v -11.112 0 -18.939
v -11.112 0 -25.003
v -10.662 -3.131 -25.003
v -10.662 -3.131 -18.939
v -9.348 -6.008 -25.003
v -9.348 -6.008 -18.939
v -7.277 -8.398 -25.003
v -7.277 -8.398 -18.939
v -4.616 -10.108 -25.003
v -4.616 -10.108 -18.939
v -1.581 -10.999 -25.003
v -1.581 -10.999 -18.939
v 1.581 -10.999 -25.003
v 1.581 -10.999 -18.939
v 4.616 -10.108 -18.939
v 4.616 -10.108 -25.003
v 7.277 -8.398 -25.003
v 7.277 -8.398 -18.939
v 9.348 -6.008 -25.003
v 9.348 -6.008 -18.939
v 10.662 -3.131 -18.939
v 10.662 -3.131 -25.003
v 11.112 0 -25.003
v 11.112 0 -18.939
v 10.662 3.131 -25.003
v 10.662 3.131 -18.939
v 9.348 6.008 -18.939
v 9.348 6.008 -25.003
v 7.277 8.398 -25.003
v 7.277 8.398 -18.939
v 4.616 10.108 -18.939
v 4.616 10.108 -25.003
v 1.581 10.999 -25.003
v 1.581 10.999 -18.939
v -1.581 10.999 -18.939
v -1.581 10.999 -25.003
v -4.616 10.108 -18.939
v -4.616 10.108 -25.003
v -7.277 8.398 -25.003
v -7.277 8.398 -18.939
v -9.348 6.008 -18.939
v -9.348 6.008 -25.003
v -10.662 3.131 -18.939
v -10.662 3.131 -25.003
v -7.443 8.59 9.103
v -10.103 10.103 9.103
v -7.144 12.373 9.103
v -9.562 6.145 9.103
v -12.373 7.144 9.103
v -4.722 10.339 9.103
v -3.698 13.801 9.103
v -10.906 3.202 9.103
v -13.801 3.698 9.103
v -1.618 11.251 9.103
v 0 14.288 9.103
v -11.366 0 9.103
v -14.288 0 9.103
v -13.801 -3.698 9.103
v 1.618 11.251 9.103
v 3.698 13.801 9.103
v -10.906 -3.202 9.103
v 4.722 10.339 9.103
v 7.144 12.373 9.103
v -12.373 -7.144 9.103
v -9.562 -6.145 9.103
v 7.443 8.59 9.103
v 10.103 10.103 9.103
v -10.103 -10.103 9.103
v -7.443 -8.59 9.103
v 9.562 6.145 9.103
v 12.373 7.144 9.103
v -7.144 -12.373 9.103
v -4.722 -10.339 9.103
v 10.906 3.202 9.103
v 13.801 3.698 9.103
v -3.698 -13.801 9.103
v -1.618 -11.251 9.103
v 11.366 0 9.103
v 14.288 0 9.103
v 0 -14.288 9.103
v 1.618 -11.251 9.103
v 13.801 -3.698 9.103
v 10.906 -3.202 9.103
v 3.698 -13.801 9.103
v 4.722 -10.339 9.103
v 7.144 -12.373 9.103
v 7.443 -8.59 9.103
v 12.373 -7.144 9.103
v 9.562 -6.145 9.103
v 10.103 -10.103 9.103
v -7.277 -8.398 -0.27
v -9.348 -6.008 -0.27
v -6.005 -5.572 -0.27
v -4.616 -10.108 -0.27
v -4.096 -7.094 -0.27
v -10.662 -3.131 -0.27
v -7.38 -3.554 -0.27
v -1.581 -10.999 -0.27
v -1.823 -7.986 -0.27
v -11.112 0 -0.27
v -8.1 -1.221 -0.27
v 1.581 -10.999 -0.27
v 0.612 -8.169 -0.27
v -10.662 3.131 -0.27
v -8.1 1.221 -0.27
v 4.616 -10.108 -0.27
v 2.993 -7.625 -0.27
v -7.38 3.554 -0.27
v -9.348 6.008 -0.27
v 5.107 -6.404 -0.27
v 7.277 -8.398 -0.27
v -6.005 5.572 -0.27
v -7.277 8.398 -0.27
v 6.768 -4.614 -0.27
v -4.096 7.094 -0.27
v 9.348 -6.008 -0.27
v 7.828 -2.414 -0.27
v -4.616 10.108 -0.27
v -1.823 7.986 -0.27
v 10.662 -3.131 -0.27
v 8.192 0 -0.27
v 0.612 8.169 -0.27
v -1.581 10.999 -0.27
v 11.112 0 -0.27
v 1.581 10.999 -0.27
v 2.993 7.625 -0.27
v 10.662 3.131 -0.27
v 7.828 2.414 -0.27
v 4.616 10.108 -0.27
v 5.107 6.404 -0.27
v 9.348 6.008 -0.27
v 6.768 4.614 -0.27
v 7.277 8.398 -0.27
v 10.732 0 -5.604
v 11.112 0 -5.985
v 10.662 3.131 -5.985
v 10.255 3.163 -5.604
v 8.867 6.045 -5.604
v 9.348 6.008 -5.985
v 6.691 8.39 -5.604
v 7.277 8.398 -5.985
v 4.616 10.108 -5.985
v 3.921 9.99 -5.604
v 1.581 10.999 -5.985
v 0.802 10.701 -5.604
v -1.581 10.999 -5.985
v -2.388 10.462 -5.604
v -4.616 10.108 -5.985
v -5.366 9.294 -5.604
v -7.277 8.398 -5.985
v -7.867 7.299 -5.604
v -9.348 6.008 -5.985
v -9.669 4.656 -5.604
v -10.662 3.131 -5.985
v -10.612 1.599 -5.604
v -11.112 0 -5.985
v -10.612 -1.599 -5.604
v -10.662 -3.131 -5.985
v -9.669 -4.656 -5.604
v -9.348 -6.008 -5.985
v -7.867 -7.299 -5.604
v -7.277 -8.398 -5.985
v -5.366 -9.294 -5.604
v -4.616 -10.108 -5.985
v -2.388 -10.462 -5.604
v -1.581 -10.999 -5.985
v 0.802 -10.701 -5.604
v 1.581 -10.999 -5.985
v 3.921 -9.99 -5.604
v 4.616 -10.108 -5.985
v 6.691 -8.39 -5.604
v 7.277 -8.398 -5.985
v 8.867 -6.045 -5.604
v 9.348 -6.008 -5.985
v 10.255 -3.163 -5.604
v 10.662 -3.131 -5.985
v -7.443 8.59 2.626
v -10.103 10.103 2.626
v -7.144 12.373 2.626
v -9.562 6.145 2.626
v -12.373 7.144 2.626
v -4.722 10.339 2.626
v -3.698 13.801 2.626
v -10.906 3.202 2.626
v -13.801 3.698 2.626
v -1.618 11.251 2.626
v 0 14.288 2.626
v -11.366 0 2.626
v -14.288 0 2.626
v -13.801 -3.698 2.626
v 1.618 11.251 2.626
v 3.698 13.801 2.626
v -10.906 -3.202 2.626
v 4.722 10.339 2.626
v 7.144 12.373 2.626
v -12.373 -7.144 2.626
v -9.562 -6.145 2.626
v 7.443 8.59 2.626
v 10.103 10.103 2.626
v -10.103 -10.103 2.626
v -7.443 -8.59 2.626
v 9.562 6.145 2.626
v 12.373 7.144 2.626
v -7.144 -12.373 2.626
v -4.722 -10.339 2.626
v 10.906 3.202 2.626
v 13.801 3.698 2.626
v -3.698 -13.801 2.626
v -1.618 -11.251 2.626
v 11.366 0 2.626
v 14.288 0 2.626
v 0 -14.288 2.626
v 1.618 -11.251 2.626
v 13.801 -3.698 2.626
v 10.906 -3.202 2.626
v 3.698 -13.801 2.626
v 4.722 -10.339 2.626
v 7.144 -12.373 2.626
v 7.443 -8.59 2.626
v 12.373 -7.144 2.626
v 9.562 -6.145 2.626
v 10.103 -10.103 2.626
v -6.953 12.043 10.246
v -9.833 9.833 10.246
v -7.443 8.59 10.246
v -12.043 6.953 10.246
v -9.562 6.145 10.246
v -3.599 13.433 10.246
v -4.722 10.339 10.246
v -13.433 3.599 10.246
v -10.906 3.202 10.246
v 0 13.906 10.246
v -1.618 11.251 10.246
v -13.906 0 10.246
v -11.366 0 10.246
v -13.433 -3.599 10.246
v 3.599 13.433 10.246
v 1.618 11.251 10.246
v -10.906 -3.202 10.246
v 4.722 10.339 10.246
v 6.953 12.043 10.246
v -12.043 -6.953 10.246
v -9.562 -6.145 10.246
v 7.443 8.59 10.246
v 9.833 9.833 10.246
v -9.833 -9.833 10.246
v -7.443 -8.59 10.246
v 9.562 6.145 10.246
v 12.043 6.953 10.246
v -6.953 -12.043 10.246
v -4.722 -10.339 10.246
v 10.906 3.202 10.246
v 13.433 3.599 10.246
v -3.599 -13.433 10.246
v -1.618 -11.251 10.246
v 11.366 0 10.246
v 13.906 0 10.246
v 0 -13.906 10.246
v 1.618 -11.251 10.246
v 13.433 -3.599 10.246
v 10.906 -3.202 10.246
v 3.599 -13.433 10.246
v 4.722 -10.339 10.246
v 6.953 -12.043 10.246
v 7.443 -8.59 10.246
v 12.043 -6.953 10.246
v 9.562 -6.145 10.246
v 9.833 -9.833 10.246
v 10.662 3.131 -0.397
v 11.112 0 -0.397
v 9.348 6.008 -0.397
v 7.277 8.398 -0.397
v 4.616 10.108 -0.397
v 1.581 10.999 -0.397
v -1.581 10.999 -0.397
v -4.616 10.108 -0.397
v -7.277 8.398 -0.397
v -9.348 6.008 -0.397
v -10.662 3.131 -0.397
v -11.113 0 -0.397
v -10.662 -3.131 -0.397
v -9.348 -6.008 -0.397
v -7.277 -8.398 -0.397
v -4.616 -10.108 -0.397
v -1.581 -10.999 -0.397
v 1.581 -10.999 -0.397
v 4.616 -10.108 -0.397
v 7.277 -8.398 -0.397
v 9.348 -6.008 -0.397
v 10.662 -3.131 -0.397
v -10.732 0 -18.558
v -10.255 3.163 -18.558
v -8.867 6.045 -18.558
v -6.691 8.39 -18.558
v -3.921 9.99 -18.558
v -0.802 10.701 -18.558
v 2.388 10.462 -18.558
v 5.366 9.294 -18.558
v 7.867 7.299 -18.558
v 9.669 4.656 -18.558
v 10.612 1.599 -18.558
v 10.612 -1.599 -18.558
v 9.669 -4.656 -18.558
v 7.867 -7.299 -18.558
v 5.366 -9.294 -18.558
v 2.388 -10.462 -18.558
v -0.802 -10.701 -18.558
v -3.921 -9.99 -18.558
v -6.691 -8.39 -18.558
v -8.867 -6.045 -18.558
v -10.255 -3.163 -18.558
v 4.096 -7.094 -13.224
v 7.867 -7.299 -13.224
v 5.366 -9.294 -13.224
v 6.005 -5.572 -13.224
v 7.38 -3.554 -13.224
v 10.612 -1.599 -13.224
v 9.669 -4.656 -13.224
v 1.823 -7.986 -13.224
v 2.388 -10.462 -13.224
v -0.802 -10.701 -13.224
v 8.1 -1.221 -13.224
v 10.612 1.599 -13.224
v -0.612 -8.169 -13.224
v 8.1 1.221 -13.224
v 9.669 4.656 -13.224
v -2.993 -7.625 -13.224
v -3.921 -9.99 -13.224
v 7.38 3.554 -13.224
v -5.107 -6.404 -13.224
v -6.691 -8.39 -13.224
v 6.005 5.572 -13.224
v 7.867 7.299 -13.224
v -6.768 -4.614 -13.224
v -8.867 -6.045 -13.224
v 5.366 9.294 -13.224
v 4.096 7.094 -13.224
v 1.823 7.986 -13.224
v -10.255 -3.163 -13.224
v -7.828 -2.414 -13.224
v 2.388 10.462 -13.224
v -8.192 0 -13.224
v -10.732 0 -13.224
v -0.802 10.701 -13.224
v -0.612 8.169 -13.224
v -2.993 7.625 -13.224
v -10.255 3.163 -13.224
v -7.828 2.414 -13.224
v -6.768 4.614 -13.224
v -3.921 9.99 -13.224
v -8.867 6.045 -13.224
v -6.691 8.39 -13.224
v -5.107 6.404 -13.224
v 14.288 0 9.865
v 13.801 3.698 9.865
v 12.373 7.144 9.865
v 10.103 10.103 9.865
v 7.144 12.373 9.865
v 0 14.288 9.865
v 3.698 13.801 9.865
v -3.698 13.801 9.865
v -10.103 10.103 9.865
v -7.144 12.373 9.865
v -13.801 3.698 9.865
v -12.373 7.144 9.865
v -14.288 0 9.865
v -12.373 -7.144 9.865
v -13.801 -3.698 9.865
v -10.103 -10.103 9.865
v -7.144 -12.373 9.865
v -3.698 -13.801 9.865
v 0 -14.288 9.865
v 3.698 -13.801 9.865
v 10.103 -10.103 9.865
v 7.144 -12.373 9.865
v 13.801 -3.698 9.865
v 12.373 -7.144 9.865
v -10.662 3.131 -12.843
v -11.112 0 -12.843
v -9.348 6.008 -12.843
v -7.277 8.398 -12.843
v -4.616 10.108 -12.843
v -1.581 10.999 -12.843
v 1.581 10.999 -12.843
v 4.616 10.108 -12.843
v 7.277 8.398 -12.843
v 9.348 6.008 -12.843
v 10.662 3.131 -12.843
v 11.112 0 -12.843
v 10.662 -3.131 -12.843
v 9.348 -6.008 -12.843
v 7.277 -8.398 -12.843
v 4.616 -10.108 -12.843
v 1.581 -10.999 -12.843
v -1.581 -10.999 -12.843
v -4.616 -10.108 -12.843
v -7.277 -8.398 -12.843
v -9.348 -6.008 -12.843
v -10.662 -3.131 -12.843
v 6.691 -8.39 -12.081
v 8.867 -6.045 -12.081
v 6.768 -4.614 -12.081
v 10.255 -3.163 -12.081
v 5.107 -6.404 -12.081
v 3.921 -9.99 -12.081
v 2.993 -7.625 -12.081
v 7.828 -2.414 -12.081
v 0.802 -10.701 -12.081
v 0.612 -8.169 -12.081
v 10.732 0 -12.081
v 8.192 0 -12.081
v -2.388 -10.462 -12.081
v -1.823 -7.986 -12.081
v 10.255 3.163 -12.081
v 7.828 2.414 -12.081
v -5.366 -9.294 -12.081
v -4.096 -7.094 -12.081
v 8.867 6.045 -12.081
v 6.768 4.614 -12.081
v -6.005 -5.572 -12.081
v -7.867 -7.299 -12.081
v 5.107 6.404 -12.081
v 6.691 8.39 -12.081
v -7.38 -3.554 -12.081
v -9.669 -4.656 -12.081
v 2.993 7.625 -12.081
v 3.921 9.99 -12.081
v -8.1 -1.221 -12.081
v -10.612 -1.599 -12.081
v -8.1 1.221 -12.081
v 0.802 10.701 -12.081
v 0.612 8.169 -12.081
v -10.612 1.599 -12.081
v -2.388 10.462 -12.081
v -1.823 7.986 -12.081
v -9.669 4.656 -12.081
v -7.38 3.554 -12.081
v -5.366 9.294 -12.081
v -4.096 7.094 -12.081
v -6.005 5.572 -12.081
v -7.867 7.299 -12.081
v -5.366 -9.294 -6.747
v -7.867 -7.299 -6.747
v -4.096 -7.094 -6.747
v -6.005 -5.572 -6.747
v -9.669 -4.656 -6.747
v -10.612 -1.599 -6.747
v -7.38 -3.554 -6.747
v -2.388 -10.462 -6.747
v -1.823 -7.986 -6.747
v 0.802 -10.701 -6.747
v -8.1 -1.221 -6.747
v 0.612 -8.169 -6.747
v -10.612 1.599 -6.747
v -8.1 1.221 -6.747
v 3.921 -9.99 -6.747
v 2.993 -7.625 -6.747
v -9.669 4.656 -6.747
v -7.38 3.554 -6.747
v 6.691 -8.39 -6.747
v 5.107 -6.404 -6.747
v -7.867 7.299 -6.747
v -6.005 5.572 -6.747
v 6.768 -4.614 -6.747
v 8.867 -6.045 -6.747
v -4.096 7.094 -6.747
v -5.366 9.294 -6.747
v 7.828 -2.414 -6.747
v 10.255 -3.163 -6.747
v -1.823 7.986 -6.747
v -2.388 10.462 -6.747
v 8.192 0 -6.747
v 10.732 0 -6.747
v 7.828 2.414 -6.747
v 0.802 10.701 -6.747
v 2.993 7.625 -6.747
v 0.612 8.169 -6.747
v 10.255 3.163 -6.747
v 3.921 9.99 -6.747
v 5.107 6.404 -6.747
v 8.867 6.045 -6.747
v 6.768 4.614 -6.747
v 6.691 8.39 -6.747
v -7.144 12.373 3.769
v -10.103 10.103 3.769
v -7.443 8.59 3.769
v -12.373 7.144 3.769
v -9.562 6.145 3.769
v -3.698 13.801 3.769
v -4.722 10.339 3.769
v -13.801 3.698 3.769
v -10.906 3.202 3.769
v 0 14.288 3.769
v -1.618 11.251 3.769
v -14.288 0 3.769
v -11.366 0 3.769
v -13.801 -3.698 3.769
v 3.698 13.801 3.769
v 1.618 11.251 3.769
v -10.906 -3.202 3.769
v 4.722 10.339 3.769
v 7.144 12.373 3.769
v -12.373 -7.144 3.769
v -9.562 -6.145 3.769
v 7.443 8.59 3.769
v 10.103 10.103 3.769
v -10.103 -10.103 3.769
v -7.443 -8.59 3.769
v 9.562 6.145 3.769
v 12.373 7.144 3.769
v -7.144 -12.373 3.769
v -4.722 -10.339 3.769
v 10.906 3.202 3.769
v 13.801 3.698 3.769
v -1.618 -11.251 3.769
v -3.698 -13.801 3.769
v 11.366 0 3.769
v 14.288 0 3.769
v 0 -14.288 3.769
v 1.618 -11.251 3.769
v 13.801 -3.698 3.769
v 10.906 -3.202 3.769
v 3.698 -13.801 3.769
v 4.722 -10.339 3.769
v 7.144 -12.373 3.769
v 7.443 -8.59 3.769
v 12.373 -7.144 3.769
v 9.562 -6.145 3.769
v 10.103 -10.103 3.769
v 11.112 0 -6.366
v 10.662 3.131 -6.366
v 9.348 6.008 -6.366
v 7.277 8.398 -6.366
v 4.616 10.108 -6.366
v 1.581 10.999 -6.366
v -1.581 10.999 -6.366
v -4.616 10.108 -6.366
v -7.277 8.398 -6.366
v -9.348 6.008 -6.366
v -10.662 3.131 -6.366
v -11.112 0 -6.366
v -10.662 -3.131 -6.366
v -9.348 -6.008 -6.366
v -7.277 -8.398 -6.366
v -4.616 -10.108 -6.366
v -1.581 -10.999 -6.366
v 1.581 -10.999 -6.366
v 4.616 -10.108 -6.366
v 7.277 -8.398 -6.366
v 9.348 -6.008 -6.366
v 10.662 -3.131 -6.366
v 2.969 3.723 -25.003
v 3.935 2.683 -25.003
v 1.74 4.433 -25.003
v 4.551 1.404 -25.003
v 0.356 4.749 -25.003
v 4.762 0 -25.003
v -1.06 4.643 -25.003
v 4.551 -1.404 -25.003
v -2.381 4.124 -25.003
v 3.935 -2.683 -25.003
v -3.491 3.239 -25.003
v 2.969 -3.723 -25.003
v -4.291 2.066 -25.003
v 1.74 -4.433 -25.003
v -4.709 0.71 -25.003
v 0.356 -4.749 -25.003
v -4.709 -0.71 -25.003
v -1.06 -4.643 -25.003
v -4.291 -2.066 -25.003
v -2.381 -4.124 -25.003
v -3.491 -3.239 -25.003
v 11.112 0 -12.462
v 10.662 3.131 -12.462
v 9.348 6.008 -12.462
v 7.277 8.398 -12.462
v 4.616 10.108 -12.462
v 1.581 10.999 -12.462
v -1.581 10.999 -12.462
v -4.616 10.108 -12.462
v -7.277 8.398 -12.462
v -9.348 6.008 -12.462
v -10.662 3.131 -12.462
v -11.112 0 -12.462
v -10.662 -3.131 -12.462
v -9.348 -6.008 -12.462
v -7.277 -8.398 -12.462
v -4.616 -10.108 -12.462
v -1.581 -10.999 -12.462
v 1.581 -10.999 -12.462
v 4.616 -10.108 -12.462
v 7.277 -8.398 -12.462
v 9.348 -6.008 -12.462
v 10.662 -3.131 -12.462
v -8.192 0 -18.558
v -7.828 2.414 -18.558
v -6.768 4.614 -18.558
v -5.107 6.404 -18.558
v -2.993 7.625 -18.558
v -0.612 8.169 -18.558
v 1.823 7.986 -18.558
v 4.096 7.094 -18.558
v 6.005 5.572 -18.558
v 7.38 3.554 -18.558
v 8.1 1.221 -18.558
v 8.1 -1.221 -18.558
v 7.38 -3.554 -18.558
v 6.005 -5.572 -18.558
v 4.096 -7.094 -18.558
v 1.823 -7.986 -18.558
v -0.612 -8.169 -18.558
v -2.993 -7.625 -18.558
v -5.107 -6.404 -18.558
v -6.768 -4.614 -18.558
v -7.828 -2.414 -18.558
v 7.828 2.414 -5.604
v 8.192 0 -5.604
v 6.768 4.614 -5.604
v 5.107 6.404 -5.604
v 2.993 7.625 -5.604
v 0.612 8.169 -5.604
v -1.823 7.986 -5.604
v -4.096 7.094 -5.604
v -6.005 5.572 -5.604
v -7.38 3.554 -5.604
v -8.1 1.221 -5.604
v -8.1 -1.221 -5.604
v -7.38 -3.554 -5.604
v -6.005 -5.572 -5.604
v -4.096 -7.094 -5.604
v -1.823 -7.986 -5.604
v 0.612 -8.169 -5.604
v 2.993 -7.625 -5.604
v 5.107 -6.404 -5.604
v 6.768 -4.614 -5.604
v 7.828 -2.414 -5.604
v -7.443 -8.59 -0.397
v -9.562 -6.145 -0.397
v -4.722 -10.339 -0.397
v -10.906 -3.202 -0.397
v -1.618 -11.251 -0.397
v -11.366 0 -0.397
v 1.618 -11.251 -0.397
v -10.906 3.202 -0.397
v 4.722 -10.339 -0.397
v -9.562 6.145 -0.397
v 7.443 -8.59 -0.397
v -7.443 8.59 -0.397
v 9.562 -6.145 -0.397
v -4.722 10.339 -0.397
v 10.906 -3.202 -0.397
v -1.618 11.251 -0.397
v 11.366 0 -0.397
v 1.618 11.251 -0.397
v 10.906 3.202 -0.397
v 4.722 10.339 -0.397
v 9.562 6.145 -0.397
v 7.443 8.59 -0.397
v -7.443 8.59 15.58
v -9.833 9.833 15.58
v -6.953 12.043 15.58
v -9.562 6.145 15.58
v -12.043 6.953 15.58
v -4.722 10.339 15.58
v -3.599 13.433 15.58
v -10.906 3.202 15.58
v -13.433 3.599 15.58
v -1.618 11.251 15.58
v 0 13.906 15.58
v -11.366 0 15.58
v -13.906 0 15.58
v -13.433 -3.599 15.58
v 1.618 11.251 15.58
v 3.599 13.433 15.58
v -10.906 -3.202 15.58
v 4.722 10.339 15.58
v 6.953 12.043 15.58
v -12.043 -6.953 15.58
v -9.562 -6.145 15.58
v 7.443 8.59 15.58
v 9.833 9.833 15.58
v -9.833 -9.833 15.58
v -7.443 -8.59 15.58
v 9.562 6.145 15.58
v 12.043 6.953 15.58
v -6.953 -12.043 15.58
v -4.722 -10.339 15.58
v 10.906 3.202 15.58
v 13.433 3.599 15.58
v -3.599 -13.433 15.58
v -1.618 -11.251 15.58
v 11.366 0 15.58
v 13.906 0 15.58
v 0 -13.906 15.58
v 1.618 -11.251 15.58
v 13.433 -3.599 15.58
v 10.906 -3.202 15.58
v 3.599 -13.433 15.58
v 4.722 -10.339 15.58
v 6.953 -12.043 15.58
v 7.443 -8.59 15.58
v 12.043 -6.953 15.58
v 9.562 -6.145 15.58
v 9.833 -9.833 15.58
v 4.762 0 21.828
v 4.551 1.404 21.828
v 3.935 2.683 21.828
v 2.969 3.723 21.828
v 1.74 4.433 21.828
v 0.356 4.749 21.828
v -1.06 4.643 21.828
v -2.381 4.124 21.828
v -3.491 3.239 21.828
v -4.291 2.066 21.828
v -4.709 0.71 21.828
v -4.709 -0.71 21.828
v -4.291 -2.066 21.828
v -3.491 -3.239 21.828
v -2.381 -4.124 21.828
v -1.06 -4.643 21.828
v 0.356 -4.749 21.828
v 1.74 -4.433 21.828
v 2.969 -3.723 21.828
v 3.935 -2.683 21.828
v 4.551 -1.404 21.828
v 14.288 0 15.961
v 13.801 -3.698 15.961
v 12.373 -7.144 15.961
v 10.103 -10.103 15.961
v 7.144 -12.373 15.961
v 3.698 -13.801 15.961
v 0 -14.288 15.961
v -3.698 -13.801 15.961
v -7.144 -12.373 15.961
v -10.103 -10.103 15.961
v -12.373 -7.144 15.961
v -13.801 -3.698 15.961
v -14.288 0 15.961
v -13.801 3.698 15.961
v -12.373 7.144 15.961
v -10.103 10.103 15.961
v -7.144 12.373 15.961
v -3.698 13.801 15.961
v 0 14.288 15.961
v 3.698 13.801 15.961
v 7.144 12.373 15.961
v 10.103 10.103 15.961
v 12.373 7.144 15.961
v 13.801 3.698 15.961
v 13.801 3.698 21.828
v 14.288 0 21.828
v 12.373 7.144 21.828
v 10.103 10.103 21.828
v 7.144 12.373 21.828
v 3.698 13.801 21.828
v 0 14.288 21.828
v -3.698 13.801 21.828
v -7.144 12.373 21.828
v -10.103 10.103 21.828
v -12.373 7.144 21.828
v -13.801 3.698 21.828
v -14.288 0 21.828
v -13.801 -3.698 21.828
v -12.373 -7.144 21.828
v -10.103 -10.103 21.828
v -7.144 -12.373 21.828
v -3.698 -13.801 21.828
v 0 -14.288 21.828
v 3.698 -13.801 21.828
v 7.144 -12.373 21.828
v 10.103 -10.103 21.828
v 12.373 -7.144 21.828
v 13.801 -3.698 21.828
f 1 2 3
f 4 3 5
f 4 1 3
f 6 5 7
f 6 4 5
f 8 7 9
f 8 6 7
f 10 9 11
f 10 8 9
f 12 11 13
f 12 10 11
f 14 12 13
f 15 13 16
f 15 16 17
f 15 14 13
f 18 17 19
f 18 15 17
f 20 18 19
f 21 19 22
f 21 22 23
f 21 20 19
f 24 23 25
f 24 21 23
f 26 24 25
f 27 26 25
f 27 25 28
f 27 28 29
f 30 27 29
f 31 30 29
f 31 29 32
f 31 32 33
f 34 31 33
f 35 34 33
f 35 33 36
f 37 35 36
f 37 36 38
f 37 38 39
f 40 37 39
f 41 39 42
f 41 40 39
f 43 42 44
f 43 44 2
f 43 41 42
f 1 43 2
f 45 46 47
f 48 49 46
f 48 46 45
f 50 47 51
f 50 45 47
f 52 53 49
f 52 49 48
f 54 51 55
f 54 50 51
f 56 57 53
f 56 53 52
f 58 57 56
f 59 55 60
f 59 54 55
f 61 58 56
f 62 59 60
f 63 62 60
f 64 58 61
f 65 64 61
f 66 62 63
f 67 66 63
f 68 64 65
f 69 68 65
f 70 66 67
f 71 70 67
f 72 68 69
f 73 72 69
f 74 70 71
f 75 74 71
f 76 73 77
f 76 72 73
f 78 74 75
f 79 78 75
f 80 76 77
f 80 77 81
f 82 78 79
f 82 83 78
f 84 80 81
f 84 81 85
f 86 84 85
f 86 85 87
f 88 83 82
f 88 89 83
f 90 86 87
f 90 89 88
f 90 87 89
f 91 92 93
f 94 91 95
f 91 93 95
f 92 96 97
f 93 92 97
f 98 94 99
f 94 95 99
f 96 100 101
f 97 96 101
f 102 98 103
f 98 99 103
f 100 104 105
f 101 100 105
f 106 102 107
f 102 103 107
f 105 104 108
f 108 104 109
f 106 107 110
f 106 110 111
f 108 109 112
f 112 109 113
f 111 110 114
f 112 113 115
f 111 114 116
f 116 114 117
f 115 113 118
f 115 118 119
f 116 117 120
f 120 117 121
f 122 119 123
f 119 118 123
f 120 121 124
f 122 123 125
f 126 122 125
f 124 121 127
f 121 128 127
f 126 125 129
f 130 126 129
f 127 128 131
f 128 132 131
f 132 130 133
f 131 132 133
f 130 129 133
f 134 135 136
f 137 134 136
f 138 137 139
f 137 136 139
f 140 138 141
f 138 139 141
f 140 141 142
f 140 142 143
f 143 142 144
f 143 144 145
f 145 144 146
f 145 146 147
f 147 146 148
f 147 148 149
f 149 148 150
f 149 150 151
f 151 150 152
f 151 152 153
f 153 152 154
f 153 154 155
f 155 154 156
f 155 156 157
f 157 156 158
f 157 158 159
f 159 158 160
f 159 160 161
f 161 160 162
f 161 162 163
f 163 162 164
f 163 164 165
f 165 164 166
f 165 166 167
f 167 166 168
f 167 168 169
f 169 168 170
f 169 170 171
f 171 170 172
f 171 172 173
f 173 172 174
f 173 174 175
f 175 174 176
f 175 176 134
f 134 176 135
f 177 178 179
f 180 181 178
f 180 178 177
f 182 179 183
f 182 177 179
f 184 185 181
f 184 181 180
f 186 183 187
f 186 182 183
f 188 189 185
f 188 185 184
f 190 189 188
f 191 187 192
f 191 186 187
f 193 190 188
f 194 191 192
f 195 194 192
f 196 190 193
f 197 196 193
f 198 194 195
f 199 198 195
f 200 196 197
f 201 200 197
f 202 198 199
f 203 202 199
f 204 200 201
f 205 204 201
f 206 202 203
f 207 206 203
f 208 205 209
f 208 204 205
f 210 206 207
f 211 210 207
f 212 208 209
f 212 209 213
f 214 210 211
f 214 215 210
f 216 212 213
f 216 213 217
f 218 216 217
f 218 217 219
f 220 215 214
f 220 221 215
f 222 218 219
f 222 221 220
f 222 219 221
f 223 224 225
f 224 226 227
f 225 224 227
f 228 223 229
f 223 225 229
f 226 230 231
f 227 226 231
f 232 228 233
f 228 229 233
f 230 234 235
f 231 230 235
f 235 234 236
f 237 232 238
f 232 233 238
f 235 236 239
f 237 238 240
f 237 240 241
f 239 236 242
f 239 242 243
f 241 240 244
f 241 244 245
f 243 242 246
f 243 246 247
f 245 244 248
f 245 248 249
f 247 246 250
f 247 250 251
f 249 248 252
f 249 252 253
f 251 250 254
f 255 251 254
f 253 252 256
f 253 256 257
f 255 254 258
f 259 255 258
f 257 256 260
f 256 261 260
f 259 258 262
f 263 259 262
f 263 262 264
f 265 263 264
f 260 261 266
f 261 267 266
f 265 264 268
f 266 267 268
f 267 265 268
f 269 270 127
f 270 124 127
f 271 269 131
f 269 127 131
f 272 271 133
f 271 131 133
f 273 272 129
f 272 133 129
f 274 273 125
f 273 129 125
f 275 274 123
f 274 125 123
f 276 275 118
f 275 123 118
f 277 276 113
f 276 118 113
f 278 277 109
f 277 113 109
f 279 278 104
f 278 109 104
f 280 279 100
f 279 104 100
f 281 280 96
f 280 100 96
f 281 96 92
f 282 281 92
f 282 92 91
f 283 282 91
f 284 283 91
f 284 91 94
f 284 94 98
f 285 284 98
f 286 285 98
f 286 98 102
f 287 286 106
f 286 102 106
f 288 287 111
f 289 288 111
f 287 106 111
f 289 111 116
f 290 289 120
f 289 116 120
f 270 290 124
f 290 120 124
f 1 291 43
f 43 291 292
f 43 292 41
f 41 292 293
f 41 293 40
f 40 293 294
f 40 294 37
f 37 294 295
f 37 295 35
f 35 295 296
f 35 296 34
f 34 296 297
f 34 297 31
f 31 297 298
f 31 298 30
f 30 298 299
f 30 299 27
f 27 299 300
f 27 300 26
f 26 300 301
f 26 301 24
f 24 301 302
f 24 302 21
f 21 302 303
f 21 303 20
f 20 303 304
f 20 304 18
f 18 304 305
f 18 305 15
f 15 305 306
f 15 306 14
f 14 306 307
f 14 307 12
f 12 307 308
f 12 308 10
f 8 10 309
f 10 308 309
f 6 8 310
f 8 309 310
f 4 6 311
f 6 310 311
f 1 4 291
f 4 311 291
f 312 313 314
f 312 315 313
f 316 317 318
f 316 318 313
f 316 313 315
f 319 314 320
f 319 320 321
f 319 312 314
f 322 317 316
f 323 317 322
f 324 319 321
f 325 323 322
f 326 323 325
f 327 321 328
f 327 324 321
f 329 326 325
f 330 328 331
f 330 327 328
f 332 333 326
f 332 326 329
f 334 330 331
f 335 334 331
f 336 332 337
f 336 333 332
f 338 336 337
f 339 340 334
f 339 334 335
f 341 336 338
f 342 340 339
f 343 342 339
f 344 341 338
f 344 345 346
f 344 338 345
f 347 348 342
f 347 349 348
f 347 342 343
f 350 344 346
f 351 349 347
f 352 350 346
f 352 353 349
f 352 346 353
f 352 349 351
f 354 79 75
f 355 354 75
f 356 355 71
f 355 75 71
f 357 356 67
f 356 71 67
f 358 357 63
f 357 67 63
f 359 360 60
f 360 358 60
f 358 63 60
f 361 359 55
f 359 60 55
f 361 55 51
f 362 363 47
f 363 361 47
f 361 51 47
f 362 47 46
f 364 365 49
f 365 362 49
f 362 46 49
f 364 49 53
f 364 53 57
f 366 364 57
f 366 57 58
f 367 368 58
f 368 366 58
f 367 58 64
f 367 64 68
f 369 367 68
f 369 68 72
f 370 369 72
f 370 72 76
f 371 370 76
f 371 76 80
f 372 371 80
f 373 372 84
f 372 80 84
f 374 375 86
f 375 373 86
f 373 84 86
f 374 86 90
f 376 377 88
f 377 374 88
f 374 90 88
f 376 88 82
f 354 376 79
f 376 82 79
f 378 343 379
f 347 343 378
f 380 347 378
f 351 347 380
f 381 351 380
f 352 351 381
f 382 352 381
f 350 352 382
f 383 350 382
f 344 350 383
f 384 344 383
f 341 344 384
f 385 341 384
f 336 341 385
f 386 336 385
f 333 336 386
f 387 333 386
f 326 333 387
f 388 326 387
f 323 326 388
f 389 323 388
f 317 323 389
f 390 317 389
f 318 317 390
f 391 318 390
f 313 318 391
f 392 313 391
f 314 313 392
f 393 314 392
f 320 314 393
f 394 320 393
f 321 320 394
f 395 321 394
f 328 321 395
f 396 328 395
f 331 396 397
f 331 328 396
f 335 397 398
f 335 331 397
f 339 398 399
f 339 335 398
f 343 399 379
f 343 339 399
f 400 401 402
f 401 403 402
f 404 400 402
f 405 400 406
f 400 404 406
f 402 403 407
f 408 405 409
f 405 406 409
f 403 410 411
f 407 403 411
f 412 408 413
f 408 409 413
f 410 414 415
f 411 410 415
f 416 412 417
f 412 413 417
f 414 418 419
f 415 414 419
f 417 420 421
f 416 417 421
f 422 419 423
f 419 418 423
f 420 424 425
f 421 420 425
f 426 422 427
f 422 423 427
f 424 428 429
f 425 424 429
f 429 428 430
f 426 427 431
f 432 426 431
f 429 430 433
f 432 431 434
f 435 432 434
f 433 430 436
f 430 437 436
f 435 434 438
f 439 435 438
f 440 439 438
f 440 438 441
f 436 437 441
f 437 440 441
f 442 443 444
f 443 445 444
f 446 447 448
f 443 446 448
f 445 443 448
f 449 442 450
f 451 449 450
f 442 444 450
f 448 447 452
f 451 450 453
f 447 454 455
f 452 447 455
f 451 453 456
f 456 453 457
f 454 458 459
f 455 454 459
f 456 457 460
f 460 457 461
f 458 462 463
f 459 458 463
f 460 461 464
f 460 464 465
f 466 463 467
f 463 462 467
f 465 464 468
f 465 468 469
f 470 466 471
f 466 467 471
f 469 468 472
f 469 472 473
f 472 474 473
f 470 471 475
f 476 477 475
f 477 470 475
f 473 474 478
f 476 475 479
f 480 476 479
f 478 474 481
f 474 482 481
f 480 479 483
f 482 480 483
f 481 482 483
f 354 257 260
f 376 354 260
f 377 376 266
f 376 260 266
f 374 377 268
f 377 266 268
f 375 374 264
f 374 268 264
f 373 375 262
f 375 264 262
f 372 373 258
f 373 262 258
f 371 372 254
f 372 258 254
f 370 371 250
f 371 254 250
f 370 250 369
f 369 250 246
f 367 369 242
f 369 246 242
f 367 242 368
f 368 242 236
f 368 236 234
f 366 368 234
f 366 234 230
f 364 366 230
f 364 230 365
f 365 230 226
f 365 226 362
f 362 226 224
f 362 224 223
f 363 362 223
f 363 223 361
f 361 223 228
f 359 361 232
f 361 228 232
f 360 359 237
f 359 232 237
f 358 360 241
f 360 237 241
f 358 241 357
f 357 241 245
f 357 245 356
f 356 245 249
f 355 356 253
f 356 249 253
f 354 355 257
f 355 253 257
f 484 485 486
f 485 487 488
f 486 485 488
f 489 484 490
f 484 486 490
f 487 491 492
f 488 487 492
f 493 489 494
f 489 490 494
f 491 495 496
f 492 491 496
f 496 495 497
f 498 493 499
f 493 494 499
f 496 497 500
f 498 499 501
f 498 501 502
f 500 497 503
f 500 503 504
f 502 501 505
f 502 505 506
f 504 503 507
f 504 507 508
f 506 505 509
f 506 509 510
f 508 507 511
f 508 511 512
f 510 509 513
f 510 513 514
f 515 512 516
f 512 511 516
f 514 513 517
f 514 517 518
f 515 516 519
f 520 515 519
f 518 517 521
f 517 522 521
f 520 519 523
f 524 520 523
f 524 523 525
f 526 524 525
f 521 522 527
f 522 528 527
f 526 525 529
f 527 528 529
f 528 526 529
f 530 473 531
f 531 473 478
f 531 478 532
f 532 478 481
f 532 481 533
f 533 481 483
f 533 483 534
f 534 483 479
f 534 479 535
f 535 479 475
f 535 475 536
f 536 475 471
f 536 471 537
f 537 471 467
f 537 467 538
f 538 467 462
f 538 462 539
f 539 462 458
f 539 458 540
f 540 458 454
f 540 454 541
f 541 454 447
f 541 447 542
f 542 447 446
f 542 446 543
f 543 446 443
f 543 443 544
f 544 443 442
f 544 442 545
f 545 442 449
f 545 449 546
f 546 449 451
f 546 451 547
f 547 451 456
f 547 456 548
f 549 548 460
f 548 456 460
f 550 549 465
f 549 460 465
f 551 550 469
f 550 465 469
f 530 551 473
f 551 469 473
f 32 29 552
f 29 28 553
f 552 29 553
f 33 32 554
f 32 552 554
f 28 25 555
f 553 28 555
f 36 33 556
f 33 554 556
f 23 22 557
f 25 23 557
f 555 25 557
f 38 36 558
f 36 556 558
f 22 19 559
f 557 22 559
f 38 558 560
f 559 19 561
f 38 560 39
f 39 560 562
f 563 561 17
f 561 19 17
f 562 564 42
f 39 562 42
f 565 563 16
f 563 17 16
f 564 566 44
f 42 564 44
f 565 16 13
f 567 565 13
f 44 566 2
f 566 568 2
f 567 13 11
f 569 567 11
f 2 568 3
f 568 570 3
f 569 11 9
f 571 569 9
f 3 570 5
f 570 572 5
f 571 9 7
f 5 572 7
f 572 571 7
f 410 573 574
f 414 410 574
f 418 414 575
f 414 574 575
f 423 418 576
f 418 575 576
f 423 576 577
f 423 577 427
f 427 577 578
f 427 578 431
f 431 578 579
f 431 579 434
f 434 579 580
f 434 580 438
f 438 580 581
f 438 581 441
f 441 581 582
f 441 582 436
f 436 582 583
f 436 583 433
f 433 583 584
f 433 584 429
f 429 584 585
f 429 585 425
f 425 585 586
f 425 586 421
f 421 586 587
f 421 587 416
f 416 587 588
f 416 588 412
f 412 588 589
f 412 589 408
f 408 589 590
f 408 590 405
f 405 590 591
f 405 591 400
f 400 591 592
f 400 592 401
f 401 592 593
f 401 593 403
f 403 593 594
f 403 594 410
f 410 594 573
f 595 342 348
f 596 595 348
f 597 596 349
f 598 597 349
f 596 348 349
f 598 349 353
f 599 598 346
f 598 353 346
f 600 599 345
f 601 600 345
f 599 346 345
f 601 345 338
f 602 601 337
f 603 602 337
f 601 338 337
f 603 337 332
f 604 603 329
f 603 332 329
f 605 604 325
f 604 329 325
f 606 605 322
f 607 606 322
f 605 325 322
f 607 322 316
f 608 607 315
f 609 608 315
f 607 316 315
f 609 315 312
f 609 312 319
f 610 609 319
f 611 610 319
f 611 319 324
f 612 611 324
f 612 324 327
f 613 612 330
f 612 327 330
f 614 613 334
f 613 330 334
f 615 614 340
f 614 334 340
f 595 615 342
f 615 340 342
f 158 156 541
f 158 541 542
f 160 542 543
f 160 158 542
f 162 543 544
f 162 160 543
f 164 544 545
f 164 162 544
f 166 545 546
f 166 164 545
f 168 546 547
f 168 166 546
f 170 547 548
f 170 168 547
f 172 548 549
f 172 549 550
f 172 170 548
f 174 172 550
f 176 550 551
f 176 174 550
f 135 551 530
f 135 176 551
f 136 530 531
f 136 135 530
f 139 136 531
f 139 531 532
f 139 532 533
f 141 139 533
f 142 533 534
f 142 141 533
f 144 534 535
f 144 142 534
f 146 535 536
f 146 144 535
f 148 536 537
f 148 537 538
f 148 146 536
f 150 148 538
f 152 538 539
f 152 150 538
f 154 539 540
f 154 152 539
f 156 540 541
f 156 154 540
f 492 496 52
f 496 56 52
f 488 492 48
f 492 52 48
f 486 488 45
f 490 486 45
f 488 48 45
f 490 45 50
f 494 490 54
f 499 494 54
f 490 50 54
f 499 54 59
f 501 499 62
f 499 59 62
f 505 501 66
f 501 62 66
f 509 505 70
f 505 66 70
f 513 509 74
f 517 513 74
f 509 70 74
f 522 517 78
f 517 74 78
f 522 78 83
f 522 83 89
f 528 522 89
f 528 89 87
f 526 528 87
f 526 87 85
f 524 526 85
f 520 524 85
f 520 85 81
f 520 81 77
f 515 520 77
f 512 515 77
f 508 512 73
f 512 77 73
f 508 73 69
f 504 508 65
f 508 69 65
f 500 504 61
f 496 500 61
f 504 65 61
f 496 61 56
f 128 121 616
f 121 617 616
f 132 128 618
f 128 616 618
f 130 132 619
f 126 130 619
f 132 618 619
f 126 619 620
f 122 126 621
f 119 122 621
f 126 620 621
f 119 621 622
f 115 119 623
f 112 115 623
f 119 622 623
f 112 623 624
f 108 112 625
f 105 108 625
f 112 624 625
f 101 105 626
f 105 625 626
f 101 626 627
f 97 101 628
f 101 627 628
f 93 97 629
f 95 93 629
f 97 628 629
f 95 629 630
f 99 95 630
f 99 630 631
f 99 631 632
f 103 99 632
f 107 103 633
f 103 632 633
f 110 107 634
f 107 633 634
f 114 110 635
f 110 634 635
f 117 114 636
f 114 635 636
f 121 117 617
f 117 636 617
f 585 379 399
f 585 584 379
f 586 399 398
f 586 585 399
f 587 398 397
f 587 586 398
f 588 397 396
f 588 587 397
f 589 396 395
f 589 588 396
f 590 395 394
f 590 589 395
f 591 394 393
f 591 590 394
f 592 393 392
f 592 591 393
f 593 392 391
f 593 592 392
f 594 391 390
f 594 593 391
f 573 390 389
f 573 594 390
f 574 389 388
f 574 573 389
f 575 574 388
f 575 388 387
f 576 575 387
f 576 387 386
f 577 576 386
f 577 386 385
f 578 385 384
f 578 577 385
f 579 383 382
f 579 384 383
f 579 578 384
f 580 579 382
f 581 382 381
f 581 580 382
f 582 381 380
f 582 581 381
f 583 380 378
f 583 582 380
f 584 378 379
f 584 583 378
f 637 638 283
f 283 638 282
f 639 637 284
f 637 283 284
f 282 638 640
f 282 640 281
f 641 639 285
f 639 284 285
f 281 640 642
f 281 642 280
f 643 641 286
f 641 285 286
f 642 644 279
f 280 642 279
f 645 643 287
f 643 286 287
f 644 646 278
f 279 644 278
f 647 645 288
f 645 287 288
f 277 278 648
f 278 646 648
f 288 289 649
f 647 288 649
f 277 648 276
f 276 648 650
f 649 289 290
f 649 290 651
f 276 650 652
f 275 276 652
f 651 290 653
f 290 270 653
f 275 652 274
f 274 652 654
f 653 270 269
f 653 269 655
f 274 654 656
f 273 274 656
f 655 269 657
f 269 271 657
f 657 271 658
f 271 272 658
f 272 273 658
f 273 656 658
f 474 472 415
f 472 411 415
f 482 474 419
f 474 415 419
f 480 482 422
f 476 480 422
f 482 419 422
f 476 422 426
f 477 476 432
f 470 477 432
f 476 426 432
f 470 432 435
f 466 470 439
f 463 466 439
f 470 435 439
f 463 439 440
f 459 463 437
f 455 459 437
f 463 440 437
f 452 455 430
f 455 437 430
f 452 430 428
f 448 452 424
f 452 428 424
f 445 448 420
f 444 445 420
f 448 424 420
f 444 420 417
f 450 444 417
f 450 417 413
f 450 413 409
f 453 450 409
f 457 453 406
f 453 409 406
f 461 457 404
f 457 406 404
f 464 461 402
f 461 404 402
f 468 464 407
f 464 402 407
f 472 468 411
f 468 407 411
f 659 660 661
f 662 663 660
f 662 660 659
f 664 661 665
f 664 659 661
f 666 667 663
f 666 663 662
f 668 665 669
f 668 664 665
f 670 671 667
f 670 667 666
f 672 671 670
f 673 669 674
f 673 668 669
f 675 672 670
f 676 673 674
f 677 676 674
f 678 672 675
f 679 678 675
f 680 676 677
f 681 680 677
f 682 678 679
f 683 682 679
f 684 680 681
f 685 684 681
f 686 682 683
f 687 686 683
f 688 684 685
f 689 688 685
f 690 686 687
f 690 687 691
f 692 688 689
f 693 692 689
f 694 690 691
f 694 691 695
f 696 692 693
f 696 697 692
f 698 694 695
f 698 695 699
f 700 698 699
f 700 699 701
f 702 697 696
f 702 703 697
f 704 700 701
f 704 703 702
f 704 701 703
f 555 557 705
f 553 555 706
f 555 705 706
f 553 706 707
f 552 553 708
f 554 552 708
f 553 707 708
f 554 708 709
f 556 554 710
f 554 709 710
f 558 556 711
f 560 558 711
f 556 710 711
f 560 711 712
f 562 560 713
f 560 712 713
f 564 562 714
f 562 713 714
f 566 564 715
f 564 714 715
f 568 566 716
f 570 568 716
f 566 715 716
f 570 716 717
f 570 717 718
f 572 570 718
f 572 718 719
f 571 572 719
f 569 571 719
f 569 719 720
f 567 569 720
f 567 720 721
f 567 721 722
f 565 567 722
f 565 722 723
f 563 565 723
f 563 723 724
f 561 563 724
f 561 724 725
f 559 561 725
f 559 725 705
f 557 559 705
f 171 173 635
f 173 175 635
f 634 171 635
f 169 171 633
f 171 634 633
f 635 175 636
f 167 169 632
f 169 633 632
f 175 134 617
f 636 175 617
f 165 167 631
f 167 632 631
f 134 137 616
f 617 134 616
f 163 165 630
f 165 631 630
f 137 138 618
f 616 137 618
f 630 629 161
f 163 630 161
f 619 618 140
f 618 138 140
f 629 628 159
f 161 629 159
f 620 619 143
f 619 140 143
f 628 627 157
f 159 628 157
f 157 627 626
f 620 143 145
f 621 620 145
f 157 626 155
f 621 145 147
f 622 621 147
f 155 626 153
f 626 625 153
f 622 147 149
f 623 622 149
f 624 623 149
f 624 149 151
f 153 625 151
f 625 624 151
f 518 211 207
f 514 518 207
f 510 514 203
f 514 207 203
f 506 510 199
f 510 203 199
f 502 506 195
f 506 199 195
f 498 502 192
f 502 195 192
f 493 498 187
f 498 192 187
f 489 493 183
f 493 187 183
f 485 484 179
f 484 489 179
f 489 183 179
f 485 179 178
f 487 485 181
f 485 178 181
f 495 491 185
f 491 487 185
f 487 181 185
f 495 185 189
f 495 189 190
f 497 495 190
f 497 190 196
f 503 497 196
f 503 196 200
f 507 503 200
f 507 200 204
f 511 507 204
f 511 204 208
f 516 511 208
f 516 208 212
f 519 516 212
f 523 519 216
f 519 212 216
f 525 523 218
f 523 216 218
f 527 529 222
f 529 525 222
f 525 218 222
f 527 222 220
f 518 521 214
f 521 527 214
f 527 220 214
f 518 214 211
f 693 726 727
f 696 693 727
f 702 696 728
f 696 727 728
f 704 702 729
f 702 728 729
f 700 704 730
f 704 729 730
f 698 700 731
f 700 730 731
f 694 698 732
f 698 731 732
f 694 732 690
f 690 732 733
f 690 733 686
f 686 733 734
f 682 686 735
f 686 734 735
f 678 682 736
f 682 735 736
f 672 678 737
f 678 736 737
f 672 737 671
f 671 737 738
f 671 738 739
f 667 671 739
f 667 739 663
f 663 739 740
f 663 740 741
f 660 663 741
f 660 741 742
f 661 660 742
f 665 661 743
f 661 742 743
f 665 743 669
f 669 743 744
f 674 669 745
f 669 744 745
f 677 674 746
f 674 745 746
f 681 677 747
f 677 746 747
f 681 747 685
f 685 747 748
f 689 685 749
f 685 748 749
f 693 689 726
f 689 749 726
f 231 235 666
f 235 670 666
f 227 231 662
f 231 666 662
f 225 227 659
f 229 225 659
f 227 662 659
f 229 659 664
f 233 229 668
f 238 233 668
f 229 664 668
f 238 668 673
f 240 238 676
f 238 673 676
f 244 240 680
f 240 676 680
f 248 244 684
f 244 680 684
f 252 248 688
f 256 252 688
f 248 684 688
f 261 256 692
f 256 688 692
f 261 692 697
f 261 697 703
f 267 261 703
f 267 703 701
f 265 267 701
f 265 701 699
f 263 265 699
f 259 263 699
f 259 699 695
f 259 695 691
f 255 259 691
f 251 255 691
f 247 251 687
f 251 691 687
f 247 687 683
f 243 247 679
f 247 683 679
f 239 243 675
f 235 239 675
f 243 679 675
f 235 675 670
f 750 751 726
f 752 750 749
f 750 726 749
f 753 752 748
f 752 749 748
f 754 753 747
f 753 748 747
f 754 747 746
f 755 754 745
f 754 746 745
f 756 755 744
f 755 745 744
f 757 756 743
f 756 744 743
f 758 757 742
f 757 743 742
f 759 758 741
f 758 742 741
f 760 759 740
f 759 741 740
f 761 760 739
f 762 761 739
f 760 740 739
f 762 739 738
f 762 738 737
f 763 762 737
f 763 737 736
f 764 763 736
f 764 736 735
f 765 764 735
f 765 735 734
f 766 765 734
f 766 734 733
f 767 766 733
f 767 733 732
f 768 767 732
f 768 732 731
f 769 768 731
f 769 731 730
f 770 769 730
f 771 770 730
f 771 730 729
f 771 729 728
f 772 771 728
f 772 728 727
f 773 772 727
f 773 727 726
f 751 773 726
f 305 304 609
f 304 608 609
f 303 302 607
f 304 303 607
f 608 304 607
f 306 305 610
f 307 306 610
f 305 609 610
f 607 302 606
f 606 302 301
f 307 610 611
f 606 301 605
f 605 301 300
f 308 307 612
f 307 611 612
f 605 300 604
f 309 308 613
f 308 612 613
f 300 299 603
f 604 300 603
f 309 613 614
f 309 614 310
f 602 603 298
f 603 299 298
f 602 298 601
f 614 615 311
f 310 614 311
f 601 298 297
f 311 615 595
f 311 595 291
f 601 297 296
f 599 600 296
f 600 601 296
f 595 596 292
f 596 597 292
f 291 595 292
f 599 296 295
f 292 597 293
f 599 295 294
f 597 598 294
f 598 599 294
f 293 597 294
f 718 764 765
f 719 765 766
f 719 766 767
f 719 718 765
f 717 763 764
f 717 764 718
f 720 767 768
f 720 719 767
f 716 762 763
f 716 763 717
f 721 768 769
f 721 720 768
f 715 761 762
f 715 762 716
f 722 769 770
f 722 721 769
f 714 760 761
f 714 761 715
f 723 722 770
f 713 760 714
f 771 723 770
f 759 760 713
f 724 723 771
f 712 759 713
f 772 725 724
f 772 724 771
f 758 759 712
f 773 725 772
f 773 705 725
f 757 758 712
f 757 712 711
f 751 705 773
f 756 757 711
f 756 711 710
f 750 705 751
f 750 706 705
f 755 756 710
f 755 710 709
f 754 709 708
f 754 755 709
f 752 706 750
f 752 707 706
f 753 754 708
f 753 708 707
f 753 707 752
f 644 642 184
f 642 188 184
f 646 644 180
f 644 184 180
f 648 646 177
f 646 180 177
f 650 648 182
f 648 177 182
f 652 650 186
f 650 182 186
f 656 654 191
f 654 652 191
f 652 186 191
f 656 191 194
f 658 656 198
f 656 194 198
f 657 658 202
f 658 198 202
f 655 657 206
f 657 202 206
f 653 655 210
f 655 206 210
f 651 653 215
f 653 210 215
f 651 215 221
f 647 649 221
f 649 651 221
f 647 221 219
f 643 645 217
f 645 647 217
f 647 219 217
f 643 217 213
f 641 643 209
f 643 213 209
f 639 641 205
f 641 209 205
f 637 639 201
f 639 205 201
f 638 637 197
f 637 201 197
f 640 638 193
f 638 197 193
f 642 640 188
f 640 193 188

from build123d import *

# Parameters (mm, degrees)
SKETCH1_R           = 11.1125
SKETCH1_R_2         = 3.2004
EXTRUDE1_DEPTH      = 25.003125
BOSS_EXTRUDE1_START = -25.4
SKETCH8_R           = 14.2875
SKETCH8_R_2         = 3.2004
BOSS_EXTRUDE1_DEPTH = 25.4
CUT_EXTRUDE1_START  = -3.175
SKETCH5_R           = 14.2875
SKETCH5_R_2         = 3.2004
CUT_EXTRUDE1_DEPTH  = 3.175
SKETCH6_R           = 4.7625
CUT_EXTRUDE2_DEPTH  = 52.004228149
CUT_EXTRUDE3_START  = -11.77925
SKETCH7_R           = 11.1125
SKETCH7_R_2         = 8.1915
CUT_EXTRUDE3_DEPTH  = 5.334
CHAMFER2_SIZE       = 0.381
CUT_EXTRUDE4_START  = 8.9154
SKETCH9_R           = 14.2875
SKETCH9_R_2         = 11.3665
CUT_EXTRUDE4_DEPTH  = 2.667
CHAMFER3_SIZE       = 0.381
LPATTERN2_COUNT     = 3
LPATTERN2_PITCH     = 6.477


# Read off the part's stored shape, not the designer's step: LPattern1
with BuildPart() as part:
    # Sketch1 → Extrude1 (new, symmetric)
    with BuildSketch(Plane.XY):
        with Locations(Location((0, 0, 0), (0, 0, 180))):
            Circle(SKETCH1_R)
        with Locations(Location((0, 0, 0), (0, 0, 180))):
            Circle(SKETCH1_R_2, mode=Mode.SUBTRACT)
    extrude(amount=EXTRUDE1_DEPTH, both=True)

    # Sketch8 → Boss-Extrude1 (add)
    with BuildSketch(Plane.XY.offset(25.003125).offset(BOSS_EXTRUDE1_START)):
        Circle(SKETCH8_R)
        with Locations(Location((0, 0, 0), (0, 0, 180))):
            Circle(SKETCH8_R_2, mode=Mode.SUBTRACT)
    extrude(amount=BOSS_EXTRUDE1_DEPTH)

    # Sketch5 → Cut-Extrude1 (cut)
    with BuildSketch(Plane.XY.offset(25.003125).offset(CUT_EXTRUDE1_START)):
        Circle(SKETCH5_R)
        with Locations(Location((0, 0, 0), (0, 0, 180))):
            Circle(SKETCH5_R_2, mode=Mode.SUBTRACT)
    extrude(amount=CUT_EXTRUDE1_DEPTH, mode=Mode.SUBTRACT)

    # Sketch6 → Cut-Extrude2 (cut, through all)
    with BuildSketch(Plane.XY.offset(21.828125)):
        Circle(SKETCH6_R)
    extrude(amount=-CUT_EXTRUDE2_DEPTH, mode=Mode.SUBTRACT)

    # Sketch7 → Cut-Extrude3 (cut)
    with BuildSketch(Plane(origin=(0, 0, -25.003125), x_dir=(-1, 0, 0), z_dir=(0, 0, -1)).offset(CUT_EXTRUDE3_START)):
        Circle(SKETCH7_R)
        Circle(SKETCH7_R_2, mode=Mode.SUBTRACT)
    extrude(amount=CUT_EXTRUDE3_DEPTH, mode=Mode.SUBTRACT)

    # Chamfer2
    chamfer2_edges = [part.edges().sort_by_distance(p)[0] for p in [
        (11.1125, 0, -13.223875),
        (11.1125, 0, -18.557875),
    ]]
    chamfer(chamfer2_edges, length=CHAMFER2_SIZE)

    # Sketch9 → Cut-Extrude4 (cut, symmetric)
    with BuildSketch(Plane(origin=(0, 0, 21.828125), x_dir=(-1, 0, 0), z_dir=(0, 0, -1)).offset(CUT_EXTRUDE4_START)):
        with Locations(Location((0, 0, 0), (0, 0, 180))):
            Circle(SKETCH9_R)
        Circle(SKETCH9_R_2, mode=Mode.SUBTRACT)
    cut_extrude4 = extrude(amount=CUT_EXTRUDE4_DEPTH, both=True, mode=Mode.SUBTRACT)

    # Chamfer3
    chamfer3_edges = [part.edges().sort_by_distance(p)[0] for p in [
        (-14.2875, 0, 15.579725),
        (-14.2875, 0, 10.245725),
    ]]
    chamfer(chamfer3_edges, length=CHAMFER3_SIZE)

    # LPattern1 outline → LPattern1 (revolve, cut)
    with BuildSketch(Plane.XZ):
        Polygon((11.1125, -0.269875), (8.1915, -0.269875), (8.1915, -5.603875), (10.7315, -5.603875), (11.1125, -5.984875), align=None)
        Polygon((11.1125, -12.461875), (11.1125, -6.365875), (10.7315, -6.746875), (8.1915, -6.746875), (8.1915, -12.080875), (10.7315, -12.080875), align=None)
    revolve(axis=Axis((0, 0, 0), (0, 0, 1)), mode=Mode.SUBTRACT)

    # LPattern2: Cut-Extrude4 ×3
    with Locations(*[(0, 0, -i * LPATTERN2_PITCH) for i in range(1, LPATTERN2_COUNT)]):
        add(cut_extrude4, mode=Mode.SUBTRACT)


solid = part.part
